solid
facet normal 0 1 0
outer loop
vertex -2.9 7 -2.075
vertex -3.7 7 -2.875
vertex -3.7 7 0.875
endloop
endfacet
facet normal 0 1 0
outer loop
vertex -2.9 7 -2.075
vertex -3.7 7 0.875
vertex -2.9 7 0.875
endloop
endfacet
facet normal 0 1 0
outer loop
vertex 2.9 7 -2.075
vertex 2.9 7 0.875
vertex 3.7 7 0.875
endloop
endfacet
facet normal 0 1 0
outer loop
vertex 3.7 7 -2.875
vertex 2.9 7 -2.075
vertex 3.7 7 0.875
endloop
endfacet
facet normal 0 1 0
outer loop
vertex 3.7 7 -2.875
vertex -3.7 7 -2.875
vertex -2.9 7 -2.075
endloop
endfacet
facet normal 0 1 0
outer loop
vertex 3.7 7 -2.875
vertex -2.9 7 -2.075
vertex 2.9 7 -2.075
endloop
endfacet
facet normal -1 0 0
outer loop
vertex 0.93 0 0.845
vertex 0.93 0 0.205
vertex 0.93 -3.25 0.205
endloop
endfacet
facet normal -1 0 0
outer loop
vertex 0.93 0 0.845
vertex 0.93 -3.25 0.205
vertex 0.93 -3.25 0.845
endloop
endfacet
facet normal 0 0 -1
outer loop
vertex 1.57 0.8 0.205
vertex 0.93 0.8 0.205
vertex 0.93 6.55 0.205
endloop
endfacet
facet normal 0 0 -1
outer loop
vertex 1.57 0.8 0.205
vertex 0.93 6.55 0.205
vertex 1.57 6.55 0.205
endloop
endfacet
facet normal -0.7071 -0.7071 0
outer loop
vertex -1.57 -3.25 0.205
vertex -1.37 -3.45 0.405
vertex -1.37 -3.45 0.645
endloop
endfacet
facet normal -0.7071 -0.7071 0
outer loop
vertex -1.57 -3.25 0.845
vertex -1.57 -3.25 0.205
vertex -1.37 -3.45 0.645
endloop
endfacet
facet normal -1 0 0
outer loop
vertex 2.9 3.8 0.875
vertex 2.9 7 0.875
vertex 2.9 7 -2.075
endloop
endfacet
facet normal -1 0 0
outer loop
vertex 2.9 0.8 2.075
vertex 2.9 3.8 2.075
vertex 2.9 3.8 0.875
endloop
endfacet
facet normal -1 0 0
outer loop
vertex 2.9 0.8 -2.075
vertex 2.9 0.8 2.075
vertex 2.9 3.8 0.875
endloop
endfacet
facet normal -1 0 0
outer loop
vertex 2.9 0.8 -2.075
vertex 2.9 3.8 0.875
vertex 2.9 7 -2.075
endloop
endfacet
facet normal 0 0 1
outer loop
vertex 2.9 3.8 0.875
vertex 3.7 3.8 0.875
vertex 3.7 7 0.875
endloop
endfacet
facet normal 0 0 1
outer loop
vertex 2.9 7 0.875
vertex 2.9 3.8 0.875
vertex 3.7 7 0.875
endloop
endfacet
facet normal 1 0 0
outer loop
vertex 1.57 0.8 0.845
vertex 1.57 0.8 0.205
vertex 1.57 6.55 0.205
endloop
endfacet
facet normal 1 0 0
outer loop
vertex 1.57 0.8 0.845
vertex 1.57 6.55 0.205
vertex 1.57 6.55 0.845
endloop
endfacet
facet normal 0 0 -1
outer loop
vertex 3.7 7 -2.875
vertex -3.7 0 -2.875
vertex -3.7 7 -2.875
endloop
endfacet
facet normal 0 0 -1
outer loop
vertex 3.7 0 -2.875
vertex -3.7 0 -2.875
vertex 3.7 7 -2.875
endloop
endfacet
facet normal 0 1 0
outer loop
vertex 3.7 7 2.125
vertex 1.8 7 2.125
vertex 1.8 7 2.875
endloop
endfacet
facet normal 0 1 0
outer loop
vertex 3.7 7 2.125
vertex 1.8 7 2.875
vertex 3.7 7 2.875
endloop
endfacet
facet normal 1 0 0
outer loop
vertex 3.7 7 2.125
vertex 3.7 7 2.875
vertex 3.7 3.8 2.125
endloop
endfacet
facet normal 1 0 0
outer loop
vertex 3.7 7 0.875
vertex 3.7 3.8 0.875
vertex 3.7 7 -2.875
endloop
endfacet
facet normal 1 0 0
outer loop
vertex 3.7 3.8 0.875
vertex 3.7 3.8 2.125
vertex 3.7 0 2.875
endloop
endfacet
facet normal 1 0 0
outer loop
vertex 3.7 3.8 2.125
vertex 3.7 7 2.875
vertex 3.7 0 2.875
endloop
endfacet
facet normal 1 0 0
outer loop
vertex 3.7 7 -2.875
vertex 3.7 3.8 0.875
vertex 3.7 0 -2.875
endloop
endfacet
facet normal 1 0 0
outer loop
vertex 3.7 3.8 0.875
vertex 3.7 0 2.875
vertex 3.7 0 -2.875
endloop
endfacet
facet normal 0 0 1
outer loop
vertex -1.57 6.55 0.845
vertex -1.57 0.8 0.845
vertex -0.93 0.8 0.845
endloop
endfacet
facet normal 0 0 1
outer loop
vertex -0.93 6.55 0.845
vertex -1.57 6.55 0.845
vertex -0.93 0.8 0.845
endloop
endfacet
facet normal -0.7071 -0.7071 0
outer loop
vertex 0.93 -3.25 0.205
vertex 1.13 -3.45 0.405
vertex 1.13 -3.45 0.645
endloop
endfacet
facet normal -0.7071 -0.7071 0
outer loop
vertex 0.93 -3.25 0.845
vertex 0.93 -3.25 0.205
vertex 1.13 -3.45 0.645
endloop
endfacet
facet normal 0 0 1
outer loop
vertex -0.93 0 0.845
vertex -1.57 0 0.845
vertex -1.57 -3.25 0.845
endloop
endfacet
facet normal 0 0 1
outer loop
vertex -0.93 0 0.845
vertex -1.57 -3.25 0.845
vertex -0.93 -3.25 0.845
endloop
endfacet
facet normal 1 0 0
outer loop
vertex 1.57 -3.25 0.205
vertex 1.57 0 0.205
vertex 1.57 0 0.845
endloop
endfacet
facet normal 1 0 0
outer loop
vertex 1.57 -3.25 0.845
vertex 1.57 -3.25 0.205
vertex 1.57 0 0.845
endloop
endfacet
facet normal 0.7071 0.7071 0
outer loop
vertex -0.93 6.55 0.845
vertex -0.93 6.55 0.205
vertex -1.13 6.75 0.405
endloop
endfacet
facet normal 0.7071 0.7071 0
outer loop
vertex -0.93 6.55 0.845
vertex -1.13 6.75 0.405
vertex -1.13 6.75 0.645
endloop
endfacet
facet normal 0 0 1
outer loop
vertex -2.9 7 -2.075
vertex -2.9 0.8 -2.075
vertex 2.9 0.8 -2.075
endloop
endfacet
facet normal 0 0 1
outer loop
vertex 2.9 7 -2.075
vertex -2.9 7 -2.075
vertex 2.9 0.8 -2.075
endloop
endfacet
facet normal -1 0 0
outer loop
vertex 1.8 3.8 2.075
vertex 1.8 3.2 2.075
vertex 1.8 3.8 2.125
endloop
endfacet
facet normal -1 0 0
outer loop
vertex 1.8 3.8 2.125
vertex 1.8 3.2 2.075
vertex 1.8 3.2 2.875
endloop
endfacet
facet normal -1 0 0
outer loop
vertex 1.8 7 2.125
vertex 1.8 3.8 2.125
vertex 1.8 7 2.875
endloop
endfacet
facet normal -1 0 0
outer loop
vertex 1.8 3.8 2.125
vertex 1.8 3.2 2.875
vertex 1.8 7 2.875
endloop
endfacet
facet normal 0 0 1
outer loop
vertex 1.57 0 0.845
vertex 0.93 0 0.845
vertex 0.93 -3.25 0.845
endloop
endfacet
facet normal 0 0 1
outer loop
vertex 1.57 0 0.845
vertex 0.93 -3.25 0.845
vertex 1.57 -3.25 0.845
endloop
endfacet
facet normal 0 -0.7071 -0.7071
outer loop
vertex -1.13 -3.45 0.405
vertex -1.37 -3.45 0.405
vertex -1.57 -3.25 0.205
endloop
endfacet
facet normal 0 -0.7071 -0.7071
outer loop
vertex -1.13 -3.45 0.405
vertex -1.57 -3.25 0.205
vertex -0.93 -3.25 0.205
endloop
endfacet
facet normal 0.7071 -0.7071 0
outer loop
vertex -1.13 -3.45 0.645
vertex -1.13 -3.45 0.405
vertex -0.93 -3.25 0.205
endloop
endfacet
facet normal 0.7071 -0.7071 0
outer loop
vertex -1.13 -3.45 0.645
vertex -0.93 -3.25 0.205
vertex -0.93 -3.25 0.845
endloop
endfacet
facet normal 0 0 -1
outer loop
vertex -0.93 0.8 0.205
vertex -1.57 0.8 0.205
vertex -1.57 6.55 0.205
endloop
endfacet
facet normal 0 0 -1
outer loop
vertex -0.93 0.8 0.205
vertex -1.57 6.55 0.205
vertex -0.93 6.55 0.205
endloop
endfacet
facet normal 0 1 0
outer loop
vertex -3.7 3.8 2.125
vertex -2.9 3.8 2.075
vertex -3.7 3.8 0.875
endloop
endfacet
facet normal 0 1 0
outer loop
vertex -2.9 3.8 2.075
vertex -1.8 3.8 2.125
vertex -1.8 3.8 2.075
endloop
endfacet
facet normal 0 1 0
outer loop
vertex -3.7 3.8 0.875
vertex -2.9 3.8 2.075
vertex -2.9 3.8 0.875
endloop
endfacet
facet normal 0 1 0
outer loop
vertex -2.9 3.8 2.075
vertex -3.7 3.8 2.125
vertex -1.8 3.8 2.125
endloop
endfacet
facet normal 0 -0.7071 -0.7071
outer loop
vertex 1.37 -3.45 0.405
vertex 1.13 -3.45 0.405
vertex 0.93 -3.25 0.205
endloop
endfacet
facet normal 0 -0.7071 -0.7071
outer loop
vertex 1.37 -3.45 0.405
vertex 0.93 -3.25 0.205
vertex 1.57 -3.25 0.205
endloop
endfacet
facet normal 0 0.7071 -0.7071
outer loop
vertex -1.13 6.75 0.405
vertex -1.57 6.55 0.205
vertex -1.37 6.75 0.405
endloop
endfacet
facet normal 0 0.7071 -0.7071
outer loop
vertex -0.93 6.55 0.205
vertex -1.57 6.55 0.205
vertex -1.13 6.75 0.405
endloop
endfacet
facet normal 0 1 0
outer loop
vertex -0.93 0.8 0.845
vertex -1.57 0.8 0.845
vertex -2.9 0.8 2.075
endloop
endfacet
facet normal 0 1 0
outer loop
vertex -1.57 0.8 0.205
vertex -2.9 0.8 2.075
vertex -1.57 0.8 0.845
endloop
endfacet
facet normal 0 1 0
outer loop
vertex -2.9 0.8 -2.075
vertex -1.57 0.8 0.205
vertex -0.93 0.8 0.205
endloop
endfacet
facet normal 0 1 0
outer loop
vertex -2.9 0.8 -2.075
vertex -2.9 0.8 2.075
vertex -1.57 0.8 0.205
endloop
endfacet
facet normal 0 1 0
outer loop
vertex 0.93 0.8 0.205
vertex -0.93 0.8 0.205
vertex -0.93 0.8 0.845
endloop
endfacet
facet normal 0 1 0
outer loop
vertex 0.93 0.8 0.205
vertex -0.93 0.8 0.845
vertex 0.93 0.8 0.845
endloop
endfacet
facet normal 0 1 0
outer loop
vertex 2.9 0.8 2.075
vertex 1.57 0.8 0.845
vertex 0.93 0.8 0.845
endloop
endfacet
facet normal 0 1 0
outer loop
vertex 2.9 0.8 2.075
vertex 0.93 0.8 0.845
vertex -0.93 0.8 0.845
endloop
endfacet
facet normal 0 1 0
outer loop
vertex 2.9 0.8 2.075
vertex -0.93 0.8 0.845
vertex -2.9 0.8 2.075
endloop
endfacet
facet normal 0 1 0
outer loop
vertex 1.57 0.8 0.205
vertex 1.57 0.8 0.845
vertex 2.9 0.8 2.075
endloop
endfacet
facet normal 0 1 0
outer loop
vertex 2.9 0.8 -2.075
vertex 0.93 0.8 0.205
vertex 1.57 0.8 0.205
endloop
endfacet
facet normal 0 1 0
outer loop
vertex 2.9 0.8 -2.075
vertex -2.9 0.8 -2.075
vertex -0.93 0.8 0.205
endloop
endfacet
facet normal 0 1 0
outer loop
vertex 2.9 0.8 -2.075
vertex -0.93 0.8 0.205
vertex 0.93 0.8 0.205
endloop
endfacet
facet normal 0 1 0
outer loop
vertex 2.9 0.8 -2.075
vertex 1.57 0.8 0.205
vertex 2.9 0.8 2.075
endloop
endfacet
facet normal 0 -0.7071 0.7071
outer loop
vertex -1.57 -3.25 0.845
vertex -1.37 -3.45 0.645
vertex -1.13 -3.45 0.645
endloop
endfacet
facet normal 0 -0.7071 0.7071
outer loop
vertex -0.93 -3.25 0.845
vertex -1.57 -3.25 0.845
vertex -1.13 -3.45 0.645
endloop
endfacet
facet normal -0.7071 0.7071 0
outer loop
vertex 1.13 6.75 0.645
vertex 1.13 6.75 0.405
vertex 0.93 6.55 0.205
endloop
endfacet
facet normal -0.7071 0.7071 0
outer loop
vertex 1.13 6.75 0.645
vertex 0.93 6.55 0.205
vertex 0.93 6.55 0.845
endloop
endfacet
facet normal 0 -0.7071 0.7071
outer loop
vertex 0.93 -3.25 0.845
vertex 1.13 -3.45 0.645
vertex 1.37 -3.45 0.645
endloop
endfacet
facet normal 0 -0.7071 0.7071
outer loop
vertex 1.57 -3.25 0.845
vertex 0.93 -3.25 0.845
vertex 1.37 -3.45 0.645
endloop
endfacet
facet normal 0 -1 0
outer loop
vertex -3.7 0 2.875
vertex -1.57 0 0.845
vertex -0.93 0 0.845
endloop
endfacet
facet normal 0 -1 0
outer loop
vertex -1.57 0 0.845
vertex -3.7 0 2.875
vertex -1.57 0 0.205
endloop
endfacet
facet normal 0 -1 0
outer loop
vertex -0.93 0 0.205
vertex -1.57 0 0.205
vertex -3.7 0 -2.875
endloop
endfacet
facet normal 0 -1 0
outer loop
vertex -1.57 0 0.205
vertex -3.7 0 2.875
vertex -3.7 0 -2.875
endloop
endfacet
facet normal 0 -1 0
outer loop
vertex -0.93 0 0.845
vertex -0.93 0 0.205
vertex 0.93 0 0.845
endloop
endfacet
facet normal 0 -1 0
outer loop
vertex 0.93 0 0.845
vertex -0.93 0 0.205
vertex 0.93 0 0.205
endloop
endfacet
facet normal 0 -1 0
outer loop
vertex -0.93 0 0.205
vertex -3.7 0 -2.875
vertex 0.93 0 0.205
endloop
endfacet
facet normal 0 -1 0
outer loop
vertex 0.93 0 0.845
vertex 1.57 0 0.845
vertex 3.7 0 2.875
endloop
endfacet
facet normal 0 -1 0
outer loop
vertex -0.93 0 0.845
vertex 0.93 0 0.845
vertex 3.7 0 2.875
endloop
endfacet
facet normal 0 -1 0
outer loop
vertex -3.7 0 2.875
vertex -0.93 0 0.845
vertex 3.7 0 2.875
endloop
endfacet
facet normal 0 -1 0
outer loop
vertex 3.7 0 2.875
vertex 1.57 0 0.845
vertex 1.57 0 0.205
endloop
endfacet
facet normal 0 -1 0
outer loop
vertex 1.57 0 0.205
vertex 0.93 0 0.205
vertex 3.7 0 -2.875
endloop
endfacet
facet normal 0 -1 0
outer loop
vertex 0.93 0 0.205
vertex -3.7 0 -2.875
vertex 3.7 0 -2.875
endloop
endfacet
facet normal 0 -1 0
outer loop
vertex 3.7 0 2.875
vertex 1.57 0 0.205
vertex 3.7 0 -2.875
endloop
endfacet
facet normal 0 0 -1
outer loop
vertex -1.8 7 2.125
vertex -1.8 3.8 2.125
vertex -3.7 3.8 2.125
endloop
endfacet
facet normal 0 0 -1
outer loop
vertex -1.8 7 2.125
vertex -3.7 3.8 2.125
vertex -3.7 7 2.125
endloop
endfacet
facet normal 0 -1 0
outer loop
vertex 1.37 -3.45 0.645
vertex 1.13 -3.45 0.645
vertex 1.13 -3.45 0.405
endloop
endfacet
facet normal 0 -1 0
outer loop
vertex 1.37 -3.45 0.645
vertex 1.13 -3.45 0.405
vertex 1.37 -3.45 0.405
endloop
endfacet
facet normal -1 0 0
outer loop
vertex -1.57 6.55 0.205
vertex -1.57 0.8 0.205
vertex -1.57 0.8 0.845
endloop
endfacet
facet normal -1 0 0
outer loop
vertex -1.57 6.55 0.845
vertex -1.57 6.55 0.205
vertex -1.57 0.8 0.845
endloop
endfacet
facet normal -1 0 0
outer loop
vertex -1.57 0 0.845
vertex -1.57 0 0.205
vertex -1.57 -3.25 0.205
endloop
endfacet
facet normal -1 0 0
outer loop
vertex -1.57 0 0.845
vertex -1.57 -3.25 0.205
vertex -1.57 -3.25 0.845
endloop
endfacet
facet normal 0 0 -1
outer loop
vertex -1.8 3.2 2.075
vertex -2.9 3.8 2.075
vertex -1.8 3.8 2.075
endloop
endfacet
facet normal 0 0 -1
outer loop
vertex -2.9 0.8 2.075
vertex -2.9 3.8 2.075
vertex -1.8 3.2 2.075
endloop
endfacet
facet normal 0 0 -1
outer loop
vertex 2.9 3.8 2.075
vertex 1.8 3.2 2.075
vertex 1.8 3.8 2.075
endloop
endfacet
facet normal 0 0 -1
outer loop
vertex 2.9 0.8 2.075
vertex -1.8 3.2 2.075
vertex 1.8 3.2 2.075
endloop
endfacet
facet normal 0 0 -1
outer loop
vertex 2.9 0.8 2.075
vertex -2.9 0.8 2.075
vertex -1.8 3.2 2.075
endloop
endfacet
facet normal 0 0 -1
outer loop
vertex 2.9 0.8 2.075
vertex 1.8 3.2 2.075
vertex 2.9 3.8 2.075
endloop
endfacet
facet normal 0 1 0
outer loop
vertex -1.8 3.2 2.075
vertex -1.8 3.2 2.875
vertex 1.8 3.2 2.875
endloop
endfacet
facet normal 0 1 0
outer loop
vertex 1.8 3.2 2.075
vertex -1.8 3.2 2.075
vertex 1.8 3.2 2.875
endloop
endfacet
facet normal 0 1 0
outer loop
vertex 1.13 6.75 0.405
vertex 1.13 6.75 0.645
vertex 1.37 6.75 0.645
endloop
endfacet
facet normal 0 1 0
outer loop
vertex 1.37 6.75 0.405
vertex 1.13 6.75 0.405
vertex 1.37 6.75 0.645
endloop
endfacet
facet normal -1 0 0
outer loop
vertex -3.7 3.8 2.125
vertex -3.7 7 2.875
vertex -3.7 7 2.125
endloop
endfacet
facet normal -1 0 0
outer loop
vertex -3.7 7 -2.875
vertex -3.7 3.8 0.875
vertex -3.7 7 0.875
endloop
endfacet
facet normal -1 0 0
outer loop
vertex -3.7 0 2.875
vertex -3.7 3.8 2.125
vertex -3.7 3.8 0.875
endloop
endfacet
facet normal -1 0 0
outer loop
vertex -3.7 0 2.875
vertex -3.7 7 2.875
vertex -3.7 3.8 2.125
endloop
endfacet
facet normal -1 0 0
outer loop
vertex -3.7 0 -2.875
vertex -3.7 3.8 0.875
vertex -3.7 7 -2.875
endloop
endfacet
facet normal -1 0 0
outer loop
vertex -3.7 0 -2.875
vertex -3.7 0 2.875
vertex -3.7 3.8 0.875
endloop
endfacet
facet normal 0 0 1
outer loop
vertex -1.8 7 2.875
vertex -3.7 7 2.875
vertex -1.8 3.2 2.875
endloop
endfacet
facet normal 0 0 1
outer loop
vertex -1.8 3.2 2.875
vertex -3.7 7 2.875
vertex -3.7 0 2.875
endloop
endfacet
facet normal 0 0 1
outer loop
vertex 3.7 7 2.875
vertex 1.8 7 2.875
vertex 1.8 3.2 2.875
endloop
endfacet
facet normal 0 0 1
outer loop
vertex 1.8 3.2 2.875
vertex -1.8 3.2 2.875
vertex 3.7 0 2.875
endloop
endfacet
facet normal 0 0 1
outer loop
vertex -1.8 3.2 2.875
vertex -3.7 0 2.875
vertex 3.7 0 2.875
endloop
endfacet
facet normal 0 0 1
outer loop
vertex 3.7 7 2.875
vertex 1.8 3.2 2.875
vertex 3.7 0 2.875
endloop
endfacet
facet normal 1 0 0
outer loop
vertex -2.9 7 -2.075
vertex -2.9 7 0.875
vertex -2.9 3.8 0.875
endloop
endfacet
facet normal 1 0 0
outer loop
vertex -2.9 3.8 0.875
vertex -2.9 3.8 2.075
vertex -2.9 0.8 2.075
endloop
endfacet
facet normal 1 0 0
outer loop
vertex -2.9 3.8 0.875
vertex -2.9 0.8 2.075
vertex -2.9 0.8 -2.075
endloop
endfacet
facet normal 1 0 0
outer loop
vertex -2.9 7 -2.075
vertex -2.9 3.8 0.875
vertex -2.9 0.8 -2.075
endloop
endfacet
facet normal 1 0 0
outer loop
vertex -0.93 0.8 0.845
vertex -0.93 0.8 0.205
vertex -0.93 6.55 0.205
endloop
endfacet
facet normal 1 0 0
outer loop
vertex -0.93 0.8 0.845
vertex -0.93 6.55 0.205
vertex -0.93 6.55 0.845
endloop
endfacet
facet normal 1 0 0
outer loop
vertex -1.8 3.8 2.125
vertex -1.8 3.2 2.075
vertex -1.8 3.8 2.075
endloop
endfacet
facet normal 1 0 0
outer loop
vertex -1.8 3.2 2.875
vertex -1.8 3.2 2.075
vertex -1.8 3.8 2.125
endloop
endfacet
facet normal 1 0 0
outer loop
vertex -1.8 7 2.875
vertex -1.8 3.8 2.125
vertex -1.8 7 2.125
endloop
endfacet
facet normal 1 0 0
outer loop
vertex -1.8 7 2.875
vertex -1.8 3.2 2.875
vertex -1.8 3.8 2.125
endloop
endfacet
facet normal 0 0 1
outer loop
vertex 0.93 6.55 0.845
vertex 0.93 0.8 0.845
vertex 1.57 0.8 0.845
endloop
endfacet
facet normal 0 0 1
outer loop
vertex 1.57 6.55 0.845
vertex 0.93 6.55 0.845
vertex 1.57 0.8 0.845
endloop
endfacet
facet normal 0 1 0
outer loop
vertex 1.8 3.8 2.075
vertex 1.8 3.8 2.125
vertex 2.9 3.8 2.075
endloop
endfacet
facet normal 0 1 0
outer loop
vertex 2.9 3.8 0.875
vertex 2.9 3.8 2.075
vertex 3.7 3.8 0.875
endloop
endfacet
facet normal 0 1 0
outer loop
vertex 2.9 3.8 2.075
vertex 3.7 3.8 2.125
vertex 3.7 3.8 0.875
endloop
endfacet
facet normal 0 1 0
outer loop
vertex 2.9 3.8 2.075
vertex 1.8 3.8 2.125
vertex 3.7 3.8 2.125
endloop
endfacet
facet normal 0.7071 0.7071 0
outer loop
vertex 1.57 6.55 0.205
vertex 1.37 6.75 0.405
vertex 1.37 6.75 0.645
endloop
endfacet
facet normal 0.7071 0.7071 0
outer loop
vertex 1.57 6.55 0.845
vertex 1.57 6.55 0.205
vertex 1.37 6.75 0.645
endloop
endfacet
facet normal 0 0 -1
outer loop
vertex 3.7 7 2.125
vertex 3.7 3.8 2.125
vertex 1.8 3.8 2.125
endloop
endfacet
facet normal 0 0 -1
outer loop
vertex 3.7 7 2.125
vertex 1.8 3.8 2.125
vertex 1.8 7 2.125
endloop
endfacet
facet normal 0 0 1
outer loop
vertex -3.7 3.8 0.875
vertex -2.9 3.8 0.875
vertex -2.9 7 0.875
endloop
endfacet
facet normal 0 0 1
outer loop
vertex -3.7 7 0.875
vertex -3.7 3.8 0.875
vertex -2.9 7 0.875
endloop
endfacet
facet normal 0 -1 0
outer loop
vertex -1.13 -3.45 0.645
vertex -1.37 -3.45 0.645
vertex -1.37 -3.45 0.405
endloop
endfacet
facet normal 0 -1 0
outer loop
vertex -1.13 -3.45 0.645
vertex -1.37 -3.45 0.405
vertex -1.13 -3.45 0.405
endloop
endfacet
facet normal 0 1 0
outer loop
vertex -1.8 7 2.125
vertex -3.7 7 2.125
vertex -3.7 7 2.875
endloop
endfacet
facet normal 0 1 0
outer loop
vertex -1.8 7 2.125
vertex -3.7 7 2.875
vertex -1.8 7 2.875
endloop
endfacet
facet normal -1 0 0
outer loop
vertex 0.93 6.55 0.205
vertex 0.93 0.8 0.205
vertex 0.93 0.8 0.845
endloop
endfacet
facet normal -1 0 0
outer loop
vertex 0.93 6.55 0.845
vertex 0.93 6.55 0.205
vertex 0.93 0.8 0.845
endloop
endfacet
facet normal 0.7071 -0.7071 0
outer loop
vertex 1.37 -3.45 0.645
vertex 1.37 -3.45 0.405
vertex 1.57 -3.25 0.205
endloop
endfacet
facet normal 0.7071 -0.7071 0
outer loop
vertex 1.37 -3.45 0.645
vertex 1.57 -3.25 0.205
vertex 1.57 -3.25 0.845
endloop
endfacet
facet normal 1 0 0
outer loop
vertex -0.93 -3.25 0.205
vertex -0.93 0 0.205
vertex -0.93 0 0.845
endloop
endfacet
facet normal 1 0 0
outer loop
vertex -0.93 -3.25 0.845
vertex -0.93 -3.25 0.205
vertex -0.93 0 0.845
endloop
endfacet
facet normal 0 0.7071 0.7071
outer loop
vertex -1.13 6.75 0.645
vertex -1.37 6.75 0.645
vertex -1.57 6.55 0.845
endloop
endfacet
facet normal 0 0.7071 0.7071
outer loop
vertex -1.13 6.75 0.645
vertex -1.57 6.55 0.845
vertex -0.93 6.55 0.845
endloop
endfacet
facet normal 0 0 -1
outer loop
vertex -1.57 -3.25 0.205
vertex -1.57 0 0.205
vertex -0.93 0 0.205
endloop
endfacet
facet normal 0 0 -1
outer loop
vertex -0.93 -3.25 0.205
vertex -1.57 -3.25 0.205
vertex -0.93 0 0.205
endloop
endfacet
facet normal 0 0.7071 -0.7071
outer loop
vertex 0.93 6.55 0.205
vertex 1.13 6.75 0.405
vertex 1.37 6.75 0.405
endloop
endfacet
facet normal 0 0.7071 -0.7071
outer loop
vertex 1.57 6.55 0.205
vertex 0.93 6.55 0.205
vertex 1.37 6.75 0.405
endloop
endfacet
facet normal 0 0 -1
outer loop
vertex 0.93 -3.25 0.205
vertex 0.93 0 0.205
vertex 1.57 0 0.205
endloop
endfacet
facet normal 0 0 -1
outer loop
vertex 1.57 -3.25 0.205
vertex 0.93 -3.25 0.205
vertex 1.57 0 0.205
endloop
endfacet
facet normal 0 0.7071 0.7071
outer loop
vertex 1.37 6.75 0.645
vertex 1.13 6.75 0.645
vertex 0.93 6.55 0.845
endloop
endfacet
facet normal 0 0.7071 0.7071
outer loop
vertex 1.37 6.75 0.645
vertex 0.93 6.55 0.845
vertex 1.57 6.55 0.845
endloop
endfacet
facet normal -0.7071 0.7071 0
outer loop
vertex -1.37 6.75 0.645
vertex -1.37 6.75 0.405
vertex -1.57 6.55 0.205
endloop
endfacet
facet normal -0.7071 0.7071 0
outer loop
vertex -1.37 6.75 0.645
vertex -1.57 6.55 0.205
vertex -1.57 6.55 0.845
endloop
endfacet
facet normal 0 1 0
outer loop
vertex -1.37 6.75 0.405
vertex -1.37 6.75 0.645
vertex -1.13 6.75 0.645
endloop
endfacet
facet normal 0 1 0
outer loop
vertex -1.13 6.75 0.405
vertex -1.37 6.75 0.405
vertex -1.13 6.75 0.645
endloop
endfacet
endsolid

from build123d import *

# Parameters (mm, degrees)
SKETCH1_W                = 7.4
SKETCH1_H                = 5.75
BOSS_EXTRUDE1_DEPTH      = 7
SHELL1_T                 = -0.8
SKETCH2_W                = 1.25
SKETCH2_H                = 3.2
CUT_EXTRUDE1_DEPTH       = 8.4
CUT_EXTRUDE2_REACH       = 7.75
SKETCH3_W                = 3.6
SKETCH3_H                = 3.8
SKETCH4_W                = 0.64
SKETCH4_H                = 0.64
BOSS_EXTRUDE2_DEPTH      = 3.45
BOSS_EXTRUDE2_DEPTH_BACK = 6.75
CHAMFER1_SIZE            = 0.2


with BuildPart() as part:
    # Sketch1 → Boss-Extrude1 (new body)
    with BuildSketch(Plane(origin=(0, 0, 0), x_dir=(1, 0, 0), z_dir=(0, 1, 0))):
        Rectangle(SKETCH1_W, SKETCH1_H)
    extrude(amount=BOSS_EXTRUDE1_DEPTH)

    # Shell1
    shell1_openings = [part.faces().sort_by_distance(p)[0] for p in [
        (0, 7, 0),
    ]]
    offset(amount=SHELL1_T, openings=shell1_openings, kind=Kind.INTERSECTION)

    # Sketch2 → Cut-Extrude1 (cut, through all)
    with BuildSketch(Plane(origin=(3.7, 0, 0), x_dir=(0, 0, -1), z_dir=(1, 0, 0))):
        with Locations((-1.5, 5.4)):
            Rectangle(SKETCH2_W, SKETCH2_H)
    extrude(amount=-CUT_EXTRUDE1_DEPTH, mode=Mode.SUBTRACT)

    # Sketch3 → Cut-Extrude2 (cut, up to next)
    with BuildSketch(Plane.XY.offset(2.875), mode=Mode.PRIVATE) as cut_extrude2_sk1:
        with Locations((0, 5.1)):
            Rectangle(SKETCH3_W, SKETCH3_H)
    cut_extrude2_tool1 = extrude(cut_extrude2_sk1.sketch, amount=-CUT_EXTRUDE2_REACH, mode=Mode.PRIVATE) & part.part
    add(cut_extrude2_tool1.solids().sort_by_distance((0, 5.1, 2.875))[0], mode=Mode.SUBTRACT)

    # Sketch4 → Boss-Extrude2 (add, two sides)
    with BuildSketch(Plane.XZ) as boss_extrude2_sk:
        with Locations((-1.25, 0.525)):
            Rectangle(SKETCH4_W, SKETCH4_H)
        with Locations((1.25, 0.525)):
            Rectangle(SKETCH4_W, SKETCH4_H)
    extrude(amount=BOSS_EXTRUDE2_DEPTH)
    extrude(boss_extrude2_sk.sketch, amount=-BOSS_EXTRUDE2_DEPTH_BACK)

    # Chamfer1
    chamfer1_edges = [part.edges().sort_by_distance(p)[0] for p in [
        (-0.93, 6.75, 0.525),
        (-1.25, 6.75, 0.205),
        (-1.57, 6.75, 0.525),
        (-1.25, 6.75, 0.845),
        (-0.93, -3.45, 0.525),
        (-1.25, -3.45, 0.845),
        (-1.57, -3.45, 0.525),
        (-1.25, -3.45, 0.205),
        (1.25, 6.75, 0.845),
        (1.57, 6.75, 0.525),
        (1.25, 6.75, 0.205),
        (0.93, 6.75, 0.525),
        (1.25, -3.45, 0.845),
        (0.93, -3.45, 0.525),
        (1.25, -3.45, 0.205),
        (1.57, -3.45, 0.525),
    ]]
    chamfer(chamfer1_edges, length=CHAMFER1_SIZE)


solid = part.part
